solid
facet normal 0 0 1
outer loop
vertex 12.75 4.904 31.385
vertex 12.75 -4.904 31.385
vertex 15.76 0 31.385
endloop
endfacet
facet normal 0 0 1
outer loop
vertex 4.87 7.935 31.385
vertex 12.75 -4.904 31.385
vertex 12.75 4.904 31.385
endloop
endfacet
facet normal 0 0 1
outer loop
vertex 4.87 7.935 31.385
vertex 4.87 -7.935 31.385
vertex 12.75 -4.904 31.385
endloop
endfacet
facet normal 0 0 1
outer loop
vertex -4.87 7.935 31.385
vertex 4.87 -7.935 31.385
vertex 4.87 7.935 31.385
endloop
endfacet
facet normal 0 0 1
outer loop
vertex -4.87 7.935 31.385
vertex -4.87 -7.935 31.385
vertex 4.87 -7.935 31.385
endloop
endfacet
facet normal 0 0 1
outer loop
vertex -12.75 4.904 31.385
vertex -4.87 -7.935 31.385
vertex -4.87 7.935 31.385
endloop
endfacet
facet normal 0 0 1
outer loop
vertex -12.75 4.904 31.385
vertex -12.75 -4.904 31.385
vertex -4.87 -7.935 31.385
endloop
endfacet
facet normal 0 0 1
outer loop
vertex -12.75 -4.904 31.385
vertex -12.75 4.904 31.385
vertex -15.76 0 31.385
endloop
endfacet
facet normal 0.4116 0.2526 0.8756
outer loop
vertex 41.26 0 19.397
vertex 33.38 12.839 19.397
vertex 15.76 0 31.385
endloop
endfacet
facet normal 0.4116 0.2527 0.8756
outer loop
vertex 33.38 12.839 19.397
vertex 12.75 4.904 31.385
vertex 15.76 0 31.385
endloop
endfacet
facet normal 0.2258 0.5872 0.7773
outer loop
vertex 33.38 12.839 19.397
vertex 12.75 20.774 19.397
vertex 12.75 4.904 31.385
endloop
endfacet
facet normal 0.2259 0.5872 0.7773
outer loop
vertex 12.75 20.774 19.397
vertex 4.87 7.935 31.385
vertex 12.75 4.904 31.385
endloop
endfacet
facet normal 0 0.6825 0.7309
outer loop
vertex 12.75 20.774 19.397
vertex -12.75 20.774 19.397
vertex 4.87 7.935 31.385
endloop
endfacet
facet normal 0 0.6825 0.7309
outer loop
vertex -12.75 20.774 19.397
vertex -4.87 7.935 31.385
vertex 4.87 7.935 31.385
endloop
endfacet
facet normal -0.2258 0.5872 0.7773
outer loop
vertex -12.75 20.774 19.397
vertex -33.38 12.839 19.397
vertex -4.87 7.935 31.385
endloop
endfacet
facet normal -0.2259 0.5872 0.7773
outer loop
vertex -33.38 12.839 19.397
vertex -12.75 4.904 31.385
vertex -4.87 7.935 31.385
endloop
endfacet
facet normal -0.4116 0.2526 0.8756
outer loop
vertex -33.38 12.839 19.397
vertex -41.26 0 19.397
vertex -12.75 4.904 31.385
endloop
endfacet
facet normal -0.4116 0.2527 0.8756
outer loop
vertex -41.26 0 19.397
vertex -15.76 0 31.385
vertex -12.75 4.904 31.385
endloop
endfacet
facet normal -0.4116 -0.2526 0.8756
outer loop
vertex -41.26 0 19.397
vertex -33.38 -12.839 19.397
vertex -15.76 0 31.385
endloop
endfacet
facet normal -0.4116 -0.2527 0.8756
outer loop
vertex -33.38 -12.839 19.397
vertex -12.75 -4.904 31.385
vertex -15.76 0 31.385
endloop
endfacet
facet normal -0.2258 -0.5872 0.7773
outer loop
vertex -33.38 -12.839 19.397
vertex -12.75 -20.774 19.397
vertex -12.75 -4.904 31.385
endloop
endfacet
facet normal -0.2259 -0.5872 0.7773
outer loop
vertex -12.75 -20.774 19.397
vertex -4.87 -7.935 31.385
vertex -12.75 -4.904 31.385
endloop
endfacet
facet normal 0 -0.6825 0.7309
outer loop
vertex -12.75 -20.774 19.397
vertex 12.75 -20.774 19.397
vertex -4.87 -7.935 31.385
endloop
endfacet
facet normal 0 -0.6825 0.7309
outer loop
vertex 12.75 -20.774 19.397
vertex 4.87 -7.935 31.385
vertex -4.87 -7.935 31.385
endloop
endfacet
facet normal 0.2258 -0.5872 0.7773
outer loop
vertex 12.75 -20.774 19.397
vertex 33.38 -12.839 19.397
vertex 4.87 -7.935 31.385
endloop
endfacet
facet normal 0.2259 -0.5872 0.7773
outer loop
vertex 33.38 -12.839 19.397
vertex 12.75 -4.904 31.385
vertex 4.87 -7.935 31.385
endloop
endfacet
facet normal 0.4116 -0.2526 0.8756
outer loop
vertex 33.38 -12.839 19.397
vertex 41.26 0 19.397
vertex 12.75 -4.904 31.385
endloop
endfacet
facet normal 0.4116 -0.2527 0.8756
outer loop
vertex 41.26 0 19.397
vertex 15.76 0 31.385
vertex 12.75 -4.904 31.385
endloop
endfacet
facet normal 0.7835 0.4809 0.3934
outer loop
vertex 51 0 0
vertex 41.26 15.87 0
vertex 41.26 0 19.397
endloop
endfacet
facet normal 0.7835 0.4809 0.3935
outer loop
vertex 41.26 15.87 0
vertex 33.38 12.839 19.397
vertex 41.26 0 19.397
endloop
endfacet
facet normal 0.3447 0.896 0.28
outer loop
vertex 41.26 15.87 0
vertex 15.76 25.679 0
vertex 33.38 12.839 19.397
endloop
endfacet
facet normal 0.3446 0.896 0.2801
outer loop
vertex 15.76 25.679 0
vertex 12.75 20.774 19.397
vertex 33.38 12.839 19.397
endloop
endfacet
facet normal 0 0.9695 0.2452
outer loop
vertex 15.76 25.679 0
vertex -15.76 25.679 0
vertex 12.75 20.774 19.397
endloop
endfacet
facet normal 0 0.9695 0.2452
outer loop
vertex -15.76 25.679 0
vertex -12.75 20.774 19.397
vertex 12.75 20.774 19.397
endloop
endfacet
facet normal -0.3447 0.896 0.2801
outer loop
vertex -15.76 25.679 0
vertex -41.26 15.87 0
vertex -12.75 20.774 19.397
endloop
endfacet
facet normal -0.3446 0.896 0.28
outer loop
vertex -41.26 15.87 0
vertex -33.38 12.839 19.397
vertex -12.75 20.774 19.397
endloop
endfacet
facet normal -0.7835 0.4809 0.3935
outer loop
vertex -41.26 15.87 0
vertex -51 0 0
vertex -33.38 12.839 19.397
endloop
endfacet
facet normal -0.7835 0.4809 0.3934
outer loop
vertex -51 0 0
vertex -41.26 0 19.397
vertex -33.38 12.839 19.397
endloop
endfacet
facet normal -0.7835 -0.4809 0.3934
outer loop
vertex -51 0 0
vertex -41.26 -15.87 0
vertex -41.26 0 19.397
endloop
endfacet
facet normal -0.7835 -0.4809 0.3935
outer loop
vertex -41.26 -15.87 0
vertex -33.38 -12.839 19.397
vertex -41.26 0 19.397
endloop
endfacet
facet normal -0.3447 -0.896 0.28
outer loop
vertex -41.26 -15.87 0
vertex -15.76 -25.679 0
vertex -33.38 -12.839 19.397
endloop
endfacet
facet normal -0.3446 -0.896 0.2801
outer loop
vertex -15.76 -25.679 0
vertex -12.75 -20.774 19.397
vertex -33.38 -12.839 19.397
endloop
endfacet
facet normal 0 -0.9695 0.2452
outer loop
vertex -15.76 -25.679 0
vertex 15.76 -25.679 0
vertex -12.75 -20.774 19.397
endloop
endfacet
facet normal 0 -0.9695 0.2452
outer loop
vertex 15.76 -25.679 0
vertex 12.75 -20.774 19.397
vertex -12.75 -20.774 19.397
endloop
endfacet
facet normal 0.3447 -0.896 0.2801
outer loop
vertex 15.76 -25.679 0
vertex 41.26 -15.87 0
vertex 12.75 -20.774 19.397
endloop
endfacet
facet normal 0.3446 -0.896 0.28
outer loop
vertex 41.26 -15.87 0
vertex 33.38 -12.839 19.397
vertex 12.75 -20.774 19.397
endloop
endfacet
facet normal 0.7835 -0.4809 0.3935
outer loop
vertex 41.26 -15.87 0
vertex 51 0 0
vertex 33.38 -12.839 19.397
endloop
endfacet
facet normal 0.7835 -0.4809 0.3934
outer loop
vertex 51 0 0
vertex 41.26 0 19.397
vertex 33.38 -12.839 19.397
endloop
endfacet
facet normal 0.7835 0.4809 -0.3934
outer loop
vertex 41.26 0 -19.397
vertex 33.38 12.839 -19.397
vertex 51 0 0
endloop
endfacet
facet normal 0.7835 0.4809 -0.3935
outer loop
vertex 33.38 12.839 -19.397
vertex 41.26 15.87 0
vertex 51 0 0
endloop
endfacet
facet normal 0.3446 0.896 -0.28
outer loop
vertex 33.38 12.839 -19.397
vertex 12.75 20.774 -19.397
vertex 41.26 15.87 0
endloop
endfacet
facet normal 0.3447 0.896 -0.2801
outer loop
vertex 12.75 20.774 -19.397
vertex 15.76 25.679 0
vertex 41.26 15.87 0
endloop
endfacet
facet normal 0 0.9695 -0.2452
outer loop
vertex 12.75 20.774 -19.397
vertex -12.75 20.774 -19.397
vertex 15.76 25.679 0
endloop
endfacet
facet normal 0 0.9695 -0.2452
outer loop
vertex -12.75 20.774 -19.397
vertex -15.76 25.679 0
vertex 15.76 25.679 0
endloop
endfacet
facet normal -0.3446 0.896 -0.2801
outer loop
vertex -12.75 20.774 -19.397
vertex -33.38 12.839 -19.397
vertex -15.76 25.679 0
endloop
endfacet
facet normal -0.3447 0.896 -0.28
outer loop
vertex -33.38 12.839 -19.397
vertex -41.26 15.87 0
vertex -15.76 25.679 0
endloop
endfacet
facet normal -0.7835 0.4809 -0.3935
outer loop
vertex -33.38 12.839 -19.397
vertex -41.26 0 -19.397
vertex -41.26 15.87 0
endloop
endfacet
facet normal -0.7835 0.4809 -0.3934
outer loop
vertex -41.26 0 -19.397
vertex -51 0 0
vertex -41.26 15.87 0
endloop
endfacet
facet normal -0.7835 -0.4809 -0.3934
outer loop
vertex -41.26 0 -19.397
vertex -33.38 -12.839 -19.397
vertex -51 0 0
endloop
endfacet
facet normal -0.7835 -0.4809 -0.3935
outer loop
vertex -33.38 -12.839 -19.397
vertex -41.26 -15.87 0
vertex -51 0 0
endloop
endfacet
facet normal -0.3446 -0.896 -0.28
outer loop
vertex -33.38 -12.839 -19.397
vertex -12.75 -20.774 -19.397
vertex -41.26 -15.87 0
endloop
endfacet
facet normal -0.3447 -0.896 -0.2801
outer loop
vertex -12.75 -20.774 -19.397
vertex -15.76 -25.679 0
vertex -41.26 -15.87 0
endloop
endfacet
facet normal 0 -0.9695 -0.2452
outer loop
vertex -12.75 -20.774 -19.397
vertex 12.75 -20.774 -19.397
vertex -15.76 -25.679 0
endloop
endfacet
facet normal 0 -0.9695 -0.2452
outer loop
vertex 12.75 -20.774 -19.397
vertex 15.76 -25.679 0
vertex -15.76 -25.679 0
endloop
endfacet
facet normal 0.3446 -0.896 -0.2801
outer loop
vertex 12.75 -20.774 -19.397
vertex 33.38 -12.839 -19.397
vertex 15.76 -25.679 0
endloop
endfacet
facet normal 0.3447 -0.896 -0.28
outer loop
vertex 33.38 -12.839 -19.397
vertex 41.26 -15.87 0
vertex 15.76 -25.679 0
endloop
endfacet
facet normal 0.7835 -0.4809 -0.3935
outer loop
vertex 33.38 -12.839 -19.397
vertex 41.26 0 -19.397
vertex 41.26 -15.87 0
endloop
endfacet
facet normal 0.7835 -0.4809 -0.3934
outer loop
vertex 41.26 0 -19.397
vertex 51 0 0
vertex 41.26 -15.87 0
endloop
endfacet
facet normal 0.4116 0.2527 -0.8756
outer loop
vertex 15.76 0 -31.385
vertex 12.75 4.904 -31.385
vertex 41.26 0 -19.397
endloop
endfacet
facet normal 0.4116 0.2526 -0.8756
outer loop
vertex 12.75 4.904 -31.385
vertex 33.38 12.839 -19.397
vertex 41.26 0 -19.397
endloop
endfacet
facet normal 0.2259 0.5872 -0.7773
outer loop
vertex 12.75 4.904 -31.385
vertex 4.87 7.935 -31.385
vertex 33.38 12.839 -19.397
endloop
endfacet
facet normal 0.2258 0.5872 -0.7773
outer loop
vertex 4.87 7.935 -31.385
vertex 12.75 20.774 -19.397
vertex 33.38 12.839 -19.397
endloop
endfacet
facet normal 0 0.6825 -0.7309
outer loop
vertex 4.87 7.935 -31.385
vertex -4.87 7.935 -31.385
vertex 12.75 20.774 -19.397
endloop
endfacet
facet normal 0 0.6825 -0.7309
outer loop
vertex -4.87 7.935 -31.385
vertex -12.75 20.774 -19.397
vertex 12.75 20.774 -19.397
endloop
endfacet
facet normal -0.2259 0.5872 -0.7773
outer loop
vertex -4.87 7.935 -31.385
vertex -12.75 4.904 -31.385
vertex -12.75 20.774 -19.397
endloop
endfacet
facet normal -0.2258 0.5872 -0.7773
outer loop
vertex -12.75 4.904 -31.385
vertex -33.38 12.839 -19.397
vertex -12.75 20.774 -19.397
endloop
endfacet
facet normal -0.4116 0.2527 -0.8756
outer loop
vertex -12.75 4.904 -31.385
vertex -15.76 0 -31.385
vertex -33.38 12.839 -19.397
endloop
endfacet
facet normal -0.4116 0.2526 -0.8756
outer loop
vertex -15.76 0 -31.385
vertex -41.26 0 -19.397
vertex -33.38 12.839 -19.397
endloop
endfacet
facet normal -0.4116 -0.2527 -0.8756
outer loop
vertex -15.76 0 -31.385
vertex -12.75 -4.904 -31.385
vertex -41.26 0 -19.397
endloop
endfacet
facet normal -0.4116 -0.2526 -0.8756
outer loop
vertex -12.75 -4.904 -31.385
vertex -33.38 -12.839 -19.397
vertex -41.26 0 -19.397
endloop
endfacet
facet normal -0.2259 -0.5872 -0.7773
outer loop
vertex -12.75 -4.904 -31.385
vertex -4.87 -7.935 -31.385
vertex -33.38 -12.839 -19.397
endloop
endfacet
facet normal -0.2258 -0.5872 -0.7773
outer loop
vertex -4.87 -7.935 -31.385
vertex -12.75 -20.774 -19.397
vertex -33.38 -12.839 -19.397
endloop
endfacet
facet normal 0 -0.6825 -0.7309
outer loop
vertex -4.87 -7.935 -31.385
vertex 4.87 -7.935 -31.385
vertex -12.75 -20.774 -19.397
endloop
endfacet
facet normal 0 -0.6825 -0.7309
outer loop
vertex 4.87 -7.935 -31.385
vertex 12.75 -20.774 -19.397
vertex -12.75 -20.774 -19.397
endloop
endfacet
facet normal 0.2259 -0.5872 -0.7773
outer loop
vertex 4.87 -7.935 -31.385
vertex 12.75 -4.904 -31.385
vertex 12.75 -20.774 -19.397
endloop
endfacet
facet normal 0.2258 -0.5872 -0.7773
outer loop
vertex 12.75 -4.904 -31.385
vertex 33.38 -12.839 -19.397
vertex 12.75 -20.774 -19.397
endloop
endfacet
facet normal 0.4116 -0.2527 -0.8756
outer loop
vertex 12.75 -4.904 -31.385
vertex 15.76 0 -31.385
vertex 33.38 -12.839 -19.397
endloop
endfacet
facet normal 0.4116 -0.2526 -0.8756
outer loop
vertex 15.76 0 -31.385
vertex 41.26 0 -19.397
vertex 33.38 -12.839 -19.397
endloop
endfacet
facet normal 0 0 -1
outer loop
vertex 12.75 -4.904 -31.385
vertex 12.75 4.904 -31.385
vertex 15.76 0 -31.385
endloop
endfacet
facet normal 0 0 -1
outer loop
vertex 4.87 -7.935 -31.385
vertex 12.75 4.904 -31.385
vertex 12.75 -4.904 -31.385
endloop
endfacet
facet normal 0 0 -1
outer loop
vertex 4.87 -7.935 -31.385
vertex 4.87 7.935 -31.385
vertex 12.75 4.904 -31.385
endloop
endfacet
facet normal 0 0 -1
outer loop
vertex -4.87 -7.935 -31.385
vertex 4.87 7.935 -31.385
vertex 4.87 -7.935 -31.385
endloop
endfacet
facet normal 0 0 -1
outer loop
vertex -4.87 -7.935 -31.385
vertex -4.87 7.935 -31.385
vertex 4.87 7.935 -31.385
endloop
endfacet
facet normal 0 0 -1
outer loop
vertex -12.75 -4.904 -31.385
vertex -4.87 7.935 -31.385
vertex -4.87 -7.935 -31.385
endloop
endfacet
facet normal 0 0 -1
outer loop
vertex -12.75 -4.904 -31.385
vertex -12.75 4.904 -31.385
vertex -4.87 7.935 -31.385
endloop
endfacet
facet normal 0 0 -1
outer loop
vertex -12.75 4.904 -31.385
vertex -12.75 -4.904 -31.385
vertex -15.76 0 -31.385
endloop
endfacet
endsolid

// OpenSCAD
// Generated by SolidPython 1.0.1 on 2020-07-29 00:46:53


scale(v = [17, 9, 11]) {
	sphere(r = 3);
}
/***********************************************
*********      SolidPython code:      **********
************************************************
 
# import packages: SolidPython
from solid import *
from solid.utils import *
from itertools import chain, combinations, permutations


class Resize:

    def __init__(self, scad_file):
        self.scad_file = scad_file
        #self.scad_file = import_scad(scad_file)
        # cone/cylinder param:
        self.r1 = 0
        self.r2 = 0
        self.h = 0
        # rectangular prism param:
        self.w = 0
        self.l = 0
        # ellipse param:
        self.r = 0

    # import OpenScad code (file name corresponds to shape)


    # classify shape + parameters
    def assign(self, param1, param2, param3):
        if self.scad_file == 'cone.scad':
            self.r1 = param1
            self.r2 = param2
            self.h = param3
        elif self.scad_file == 'cylinder.scad':
            self.r1 = param1
            self.r2 = param2
            self.h = param3
        elif self.scad_file == 'rectangularPrism.scad':
            self.h = param1
            self.l = param2
            self.w = param3
        else:
            self.r = param1
            self.h = param2

    # resize parameters
    def iterate(self):
        x = range(3, 20, 2)
        i = 1
        if self.scad_file == 'cone.scad':
            tempList = list(permutations(x, 2))
            for temp in tempList:
                param1 = temp[0]
                param2 = temp[1]
                filepath = 'produced_scad_files/' + 'cone' + str(param1) + '_' + str(param2) + '_' + '.scad'
                scad_render_to_file(cylinder(h=param1, r1=param2, r2=0), filepath)

        elif self.scad_file == 'cylinder.scad':
            tempList = list(permutations(x, 3))
            for temp in tempList:
                param1 = temp[0]
                param2 = temp[1]
                filepath = 'produced_scad_files/' + 'cylinder' + str(param1) + '_' + str(param2) + '_' + '.scad'
                scad_render_to_file(cylinder(h=param1, r1=param2, r2=param2), filepath)

        elif self.scad_file == 'rectangularPrism.scad':
            tempList = list(permutations(x, 3))
            for temp in tempList:
                param1 = temp[0]
                param2 = temp[1]
                param3 = temp[2]
                filepath = 'produced_scad_files/' + 'rectangularPrism' + str(param1) + '_' + str(param2) + '_' + str(
                    param3) + '.scad'
                scad_render_to_file(cube(size=(param1, param2, param3)), filepath)

        elif self.scad_file == 'ellipse.scad':
            tempList = list(permutations(x, 4))
            for temp in tempList:
                param1 = temp[0]
                param2 = temp[1]
                param3 = temp[2]
                param4 = temp[3]
                filepath = 'produced_scad_files/' + 'ellipse' + str(param1) + '_' + str(param2) + '_' + str(param3) + '_' + str(param4) + '.scad'
                scad_render_to_file(scale([param1, param2, param3])(sphere(r=param4)), filepath)

    def render_to_scadfile(self):
        scad_render_to_file(scad, 'example.scad') 
 
************************************************/
